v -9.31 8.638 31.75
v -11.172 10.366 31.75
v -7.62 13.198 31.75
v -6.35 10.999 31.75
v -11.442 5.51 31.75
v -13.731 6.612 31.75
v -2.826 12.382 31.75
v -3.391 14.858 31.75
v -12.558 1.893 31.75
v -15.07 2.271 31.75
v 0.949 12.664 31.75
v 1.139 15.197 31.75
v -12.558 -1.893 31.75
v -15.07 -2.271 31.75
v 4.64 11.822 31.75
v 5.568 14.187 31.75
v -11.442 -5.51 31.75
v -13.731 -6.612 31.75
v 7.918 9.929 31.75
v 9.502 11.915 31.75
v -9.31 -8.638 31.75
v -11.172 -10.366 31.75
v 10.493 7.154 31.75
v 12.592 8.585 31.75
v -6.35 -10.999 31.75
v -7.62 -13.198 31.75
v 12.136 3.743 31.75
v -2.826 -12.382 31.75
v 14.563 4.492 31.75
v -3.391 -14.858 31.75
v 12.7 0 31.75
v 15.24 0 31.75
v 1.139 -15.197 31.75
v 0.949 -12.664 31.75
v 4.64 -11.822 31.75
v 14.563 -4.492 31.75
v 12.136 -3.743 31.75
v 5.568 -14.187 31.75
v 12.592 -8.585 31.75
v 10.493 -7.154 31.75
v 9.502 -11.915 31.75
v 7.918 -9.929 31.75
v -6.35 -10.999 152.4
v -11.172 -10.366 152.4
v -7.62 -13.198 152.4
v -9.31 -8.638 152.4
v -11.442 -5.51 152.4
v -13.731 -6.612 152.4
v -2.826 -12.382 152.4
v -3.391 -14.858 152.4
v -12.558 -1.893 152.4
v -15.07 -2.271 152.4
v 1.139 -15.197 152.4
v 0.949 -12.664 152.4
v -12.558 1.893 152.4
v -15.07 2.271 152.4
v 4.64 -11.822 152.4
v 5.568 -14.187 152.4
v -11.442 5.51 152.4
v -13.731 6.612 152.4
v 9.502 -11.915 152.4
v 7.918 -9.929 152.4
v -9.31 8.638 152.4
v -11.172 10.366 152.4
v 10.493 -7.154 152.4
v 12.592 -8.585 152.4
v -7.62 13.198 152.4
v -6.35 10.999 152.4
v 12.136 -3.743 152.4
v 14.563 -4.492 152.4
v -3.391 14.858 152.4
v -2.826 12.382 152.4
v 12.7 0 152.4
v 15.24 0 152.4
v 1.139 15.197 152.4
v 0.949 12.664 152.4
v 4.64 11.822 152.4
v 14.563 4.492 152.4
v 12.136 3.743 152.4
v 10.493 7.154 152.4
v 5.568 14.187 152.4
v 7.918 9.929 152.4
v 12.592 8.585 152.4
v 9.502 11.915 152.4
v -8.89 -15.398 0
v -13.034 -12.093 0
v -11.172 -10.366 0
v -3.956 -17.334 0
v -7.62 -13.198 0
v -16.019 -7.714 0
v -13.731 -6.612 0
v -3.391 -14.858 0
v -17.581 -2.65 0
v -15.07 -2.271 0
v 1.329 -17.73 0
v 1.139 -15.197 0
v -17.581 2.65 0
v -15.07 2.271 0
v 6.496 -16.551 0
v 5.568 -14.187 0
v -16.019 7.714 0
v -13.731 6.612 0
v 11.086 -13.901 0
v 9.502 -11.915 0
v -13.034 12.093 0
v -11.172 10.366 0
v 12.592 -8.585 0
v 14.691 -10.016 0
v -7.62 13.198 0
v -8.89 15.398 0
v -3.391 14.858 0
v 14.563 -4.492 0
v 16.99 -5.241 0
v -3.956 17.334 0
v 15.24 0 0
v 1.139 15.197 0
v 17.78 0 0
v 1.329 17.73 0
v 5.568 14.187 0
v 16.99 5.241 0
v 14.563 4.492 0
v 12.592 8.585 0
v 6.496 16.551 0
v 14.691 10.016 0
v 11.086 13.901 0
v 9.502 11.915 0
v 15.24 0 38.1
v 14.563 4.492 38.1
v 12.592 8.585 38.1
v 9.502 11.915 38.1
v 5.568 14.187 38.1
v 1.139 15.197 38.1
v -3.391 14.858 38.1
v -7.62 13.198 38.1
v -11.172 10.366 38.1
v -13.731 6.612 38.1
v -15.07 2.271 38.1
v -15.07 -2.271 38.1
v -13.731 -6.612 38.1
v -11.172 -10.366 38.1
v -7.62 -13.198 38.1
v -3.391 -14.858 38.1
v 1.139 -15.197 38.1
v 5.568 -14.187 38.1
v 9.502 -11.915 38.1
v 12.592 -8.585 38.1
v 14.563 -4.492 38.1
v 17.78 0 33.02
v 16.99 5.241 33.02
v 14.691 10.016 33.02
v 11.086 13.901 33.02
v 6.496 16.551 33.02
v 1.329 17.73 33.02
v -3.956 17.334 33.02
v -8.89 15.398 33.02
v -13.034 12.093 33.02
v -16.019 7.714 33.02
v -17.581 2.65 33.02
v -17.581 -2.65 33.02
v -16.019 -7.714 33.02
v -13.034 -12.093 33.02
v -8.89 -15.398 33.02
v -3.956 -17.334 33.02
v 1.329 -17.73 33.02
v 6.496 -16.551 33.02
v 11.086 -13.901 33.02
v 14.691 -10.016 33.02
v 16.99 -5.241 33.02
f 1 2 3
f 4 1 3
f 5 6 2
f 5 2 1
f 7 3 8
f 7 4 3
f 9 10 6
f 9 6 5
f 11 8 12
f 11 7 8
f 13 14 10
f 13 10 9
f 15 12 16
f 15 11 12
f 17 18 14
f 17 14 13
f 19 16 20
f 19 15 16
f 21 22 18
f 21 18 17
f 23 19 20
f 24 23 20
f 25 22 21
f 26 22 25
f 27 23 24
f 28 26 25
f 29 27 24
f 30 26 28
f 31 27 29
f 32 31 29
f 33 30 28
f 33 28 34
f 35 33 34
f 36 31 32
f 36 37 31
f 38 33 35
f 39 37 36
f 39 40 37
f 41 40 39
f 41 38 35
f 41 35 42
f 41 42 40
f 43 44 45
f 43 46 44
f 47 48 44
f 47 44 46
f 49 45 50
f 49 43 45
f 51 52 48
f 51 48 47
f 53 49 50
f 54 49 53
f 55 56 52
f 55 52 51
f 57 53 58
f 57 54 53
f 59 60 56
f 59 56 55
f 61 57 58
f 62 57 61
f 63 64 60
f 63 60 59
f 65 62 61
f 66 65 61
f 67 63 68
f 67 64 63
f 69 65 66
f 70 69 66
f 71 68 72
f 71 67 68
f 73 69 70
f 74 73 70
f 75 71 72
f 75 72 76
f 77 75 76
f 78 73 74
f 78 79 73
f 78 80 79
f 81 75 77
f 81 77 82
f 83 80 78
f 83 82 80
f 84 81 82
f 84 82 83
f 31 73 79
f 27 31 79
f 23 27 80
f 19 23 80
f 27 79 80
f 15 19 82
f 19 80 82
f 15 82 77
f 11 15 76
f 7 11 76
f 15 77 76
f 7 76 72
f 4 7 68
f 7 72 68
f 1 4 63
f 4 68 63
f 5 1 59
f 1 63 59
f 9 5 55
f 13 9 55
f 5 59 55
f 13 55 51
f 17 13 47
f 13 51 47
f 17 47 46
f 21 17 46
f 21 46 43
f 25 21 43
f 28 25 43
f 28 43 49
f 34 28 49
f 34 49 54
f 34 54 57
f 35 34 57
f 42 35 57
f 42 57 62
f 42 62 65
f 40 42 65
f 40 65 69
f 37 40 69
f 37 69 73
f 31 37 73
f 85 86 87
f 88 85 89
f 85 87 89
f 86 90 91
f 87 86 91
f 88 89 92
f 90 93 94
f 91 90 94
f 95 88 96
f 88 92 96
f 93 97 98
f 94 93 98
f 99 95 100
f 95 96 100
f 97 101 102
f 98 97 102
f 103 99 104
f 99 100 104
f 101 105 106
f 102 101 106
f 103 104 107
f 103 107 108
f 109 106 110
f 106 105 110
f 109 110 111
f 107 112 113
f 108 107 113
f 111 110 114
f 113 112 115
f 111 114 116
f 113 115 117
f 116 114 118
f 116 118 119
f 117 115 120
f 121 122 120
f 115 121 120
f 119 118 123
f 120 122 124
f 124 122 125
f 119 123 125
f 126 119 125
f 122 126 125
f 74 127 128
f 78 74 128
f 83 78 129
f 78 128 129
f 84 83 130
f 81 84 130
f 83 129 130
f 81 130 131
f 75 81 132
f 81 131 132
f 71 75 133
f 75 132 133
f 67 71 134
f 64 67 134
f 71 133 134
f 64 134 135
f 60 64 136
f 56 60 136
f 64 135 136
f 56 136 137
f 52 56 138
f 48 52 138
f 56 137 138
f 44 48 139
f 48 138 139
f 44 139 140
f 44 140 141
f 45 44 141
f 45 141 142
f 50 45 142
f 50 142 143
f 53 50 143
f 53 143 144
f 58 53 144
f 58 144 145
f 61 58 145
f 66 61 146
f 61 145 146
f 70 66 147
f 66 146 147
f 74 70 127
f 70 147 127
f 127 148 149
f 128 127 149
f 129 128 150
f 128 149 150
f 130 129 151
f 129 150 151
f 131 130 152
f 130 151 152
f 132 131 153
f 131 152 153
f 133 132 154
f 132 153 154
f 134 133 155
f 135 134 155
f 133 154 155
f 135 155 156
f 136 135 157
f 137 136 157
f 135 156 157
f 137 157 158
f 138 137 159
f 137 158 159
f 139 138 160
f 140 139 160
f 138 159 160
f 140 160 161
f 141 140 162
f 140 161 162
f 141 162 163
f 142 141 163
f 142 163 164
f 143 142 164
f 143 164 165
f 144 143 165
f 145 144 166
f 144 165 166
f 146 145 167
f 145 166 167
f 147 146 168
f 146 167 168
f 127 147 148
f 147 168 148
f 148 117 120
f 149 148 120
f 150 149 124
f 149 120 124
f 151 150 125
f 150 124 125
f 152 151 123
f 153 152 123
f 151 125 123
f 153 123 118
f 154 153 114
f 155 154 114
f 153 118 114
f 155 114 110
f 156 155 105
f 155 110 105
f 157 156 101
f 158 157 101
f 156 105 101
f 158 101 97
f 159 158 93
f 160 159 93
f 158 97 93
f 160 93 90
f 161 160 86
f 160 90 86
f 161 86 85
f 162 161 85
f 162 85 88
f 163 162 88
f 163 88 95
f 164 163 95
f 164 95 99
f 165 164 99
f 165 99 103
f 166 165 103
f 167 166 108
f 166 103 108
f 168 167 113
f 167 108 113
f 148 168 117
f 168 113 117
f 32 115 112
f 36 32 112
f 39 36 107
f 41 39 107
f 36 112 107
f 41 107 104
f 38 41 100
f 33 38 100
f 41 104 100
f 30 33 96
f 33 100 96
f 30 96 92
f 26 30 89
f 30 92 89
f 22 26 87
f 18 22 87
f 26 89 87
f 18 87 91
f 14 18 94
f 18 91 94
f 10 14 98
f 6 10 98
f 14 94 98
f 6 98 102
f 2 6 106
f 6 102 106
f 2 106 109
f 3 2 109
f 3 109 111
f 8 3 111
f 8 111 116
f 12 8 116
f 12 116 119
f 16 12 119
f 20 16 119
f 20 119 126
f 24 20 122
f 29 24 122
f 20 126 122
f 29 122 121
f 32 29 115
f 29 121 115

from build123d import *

# Parameters (mm, degrees)
F0_R     = 17.78
F1_DEPTH = 38.1
F2_R     = 15.24
F3_DEPTH = 114.3
F4_R     = 15.24
F5_DEPTH = 31.75
F6_R     = 12.7
F7_DEPTH = 127
F8_SIZE2 = 5.07999
F8_SIZE  = 2.53999


# Not quite as in the source:
# - a fillet or chamfer is up to 0.001 mm smaller than in the source, because OpenCascade refuses the exact size


with BuildPart() as f1:
    # F0 (on Top) → F1 (new body)
    with BuildSketch(Plane.XY):
        Circle(F0_R)
    extrude(amount=F1_DEPTH)

    # F2 (on face) → F3 (join)
    with BuildSketch(Plane.XY.offset(38.1)):
        Circle(F2_R)
    extrude(amount=F3_DEPTH)

    # F4 (on face) → F5 (cut)
    with BuildSketch(Plane(origin=(0, 0, 0), x_dir=(1, 0, 0), z_dir=(0, 0, -1))):
        Circle(F4_R)
    extrude(amount=-F5_DEPTH, mode=Mode.SUBTRACT)

    # F6 (on face) → F7 (cut)
    with BuildSketch(Plane.XY.offset(152.4)):
        Circle(F6_R)
    extrude(amount=-F7_DEPTH, mode=Mode.SUBTRACT)

    # F8 (size 2.54 and 5.08 in the source; OpenCascade refuses exactly that, so slightly less here)
    f8_edges = [f1.edges().sort_by_distance(p)[0] for p in [
        (-17.78, 0, 38.1),
    ]]
    f8_side = f1.faces().sort_by_distance((-17.277106, 0, 38.1))[0]
    chamfer(f8_edges, length=F8_SIZE, length2=F8_SIZE2, reference=f8_side)


solid = f1.part
